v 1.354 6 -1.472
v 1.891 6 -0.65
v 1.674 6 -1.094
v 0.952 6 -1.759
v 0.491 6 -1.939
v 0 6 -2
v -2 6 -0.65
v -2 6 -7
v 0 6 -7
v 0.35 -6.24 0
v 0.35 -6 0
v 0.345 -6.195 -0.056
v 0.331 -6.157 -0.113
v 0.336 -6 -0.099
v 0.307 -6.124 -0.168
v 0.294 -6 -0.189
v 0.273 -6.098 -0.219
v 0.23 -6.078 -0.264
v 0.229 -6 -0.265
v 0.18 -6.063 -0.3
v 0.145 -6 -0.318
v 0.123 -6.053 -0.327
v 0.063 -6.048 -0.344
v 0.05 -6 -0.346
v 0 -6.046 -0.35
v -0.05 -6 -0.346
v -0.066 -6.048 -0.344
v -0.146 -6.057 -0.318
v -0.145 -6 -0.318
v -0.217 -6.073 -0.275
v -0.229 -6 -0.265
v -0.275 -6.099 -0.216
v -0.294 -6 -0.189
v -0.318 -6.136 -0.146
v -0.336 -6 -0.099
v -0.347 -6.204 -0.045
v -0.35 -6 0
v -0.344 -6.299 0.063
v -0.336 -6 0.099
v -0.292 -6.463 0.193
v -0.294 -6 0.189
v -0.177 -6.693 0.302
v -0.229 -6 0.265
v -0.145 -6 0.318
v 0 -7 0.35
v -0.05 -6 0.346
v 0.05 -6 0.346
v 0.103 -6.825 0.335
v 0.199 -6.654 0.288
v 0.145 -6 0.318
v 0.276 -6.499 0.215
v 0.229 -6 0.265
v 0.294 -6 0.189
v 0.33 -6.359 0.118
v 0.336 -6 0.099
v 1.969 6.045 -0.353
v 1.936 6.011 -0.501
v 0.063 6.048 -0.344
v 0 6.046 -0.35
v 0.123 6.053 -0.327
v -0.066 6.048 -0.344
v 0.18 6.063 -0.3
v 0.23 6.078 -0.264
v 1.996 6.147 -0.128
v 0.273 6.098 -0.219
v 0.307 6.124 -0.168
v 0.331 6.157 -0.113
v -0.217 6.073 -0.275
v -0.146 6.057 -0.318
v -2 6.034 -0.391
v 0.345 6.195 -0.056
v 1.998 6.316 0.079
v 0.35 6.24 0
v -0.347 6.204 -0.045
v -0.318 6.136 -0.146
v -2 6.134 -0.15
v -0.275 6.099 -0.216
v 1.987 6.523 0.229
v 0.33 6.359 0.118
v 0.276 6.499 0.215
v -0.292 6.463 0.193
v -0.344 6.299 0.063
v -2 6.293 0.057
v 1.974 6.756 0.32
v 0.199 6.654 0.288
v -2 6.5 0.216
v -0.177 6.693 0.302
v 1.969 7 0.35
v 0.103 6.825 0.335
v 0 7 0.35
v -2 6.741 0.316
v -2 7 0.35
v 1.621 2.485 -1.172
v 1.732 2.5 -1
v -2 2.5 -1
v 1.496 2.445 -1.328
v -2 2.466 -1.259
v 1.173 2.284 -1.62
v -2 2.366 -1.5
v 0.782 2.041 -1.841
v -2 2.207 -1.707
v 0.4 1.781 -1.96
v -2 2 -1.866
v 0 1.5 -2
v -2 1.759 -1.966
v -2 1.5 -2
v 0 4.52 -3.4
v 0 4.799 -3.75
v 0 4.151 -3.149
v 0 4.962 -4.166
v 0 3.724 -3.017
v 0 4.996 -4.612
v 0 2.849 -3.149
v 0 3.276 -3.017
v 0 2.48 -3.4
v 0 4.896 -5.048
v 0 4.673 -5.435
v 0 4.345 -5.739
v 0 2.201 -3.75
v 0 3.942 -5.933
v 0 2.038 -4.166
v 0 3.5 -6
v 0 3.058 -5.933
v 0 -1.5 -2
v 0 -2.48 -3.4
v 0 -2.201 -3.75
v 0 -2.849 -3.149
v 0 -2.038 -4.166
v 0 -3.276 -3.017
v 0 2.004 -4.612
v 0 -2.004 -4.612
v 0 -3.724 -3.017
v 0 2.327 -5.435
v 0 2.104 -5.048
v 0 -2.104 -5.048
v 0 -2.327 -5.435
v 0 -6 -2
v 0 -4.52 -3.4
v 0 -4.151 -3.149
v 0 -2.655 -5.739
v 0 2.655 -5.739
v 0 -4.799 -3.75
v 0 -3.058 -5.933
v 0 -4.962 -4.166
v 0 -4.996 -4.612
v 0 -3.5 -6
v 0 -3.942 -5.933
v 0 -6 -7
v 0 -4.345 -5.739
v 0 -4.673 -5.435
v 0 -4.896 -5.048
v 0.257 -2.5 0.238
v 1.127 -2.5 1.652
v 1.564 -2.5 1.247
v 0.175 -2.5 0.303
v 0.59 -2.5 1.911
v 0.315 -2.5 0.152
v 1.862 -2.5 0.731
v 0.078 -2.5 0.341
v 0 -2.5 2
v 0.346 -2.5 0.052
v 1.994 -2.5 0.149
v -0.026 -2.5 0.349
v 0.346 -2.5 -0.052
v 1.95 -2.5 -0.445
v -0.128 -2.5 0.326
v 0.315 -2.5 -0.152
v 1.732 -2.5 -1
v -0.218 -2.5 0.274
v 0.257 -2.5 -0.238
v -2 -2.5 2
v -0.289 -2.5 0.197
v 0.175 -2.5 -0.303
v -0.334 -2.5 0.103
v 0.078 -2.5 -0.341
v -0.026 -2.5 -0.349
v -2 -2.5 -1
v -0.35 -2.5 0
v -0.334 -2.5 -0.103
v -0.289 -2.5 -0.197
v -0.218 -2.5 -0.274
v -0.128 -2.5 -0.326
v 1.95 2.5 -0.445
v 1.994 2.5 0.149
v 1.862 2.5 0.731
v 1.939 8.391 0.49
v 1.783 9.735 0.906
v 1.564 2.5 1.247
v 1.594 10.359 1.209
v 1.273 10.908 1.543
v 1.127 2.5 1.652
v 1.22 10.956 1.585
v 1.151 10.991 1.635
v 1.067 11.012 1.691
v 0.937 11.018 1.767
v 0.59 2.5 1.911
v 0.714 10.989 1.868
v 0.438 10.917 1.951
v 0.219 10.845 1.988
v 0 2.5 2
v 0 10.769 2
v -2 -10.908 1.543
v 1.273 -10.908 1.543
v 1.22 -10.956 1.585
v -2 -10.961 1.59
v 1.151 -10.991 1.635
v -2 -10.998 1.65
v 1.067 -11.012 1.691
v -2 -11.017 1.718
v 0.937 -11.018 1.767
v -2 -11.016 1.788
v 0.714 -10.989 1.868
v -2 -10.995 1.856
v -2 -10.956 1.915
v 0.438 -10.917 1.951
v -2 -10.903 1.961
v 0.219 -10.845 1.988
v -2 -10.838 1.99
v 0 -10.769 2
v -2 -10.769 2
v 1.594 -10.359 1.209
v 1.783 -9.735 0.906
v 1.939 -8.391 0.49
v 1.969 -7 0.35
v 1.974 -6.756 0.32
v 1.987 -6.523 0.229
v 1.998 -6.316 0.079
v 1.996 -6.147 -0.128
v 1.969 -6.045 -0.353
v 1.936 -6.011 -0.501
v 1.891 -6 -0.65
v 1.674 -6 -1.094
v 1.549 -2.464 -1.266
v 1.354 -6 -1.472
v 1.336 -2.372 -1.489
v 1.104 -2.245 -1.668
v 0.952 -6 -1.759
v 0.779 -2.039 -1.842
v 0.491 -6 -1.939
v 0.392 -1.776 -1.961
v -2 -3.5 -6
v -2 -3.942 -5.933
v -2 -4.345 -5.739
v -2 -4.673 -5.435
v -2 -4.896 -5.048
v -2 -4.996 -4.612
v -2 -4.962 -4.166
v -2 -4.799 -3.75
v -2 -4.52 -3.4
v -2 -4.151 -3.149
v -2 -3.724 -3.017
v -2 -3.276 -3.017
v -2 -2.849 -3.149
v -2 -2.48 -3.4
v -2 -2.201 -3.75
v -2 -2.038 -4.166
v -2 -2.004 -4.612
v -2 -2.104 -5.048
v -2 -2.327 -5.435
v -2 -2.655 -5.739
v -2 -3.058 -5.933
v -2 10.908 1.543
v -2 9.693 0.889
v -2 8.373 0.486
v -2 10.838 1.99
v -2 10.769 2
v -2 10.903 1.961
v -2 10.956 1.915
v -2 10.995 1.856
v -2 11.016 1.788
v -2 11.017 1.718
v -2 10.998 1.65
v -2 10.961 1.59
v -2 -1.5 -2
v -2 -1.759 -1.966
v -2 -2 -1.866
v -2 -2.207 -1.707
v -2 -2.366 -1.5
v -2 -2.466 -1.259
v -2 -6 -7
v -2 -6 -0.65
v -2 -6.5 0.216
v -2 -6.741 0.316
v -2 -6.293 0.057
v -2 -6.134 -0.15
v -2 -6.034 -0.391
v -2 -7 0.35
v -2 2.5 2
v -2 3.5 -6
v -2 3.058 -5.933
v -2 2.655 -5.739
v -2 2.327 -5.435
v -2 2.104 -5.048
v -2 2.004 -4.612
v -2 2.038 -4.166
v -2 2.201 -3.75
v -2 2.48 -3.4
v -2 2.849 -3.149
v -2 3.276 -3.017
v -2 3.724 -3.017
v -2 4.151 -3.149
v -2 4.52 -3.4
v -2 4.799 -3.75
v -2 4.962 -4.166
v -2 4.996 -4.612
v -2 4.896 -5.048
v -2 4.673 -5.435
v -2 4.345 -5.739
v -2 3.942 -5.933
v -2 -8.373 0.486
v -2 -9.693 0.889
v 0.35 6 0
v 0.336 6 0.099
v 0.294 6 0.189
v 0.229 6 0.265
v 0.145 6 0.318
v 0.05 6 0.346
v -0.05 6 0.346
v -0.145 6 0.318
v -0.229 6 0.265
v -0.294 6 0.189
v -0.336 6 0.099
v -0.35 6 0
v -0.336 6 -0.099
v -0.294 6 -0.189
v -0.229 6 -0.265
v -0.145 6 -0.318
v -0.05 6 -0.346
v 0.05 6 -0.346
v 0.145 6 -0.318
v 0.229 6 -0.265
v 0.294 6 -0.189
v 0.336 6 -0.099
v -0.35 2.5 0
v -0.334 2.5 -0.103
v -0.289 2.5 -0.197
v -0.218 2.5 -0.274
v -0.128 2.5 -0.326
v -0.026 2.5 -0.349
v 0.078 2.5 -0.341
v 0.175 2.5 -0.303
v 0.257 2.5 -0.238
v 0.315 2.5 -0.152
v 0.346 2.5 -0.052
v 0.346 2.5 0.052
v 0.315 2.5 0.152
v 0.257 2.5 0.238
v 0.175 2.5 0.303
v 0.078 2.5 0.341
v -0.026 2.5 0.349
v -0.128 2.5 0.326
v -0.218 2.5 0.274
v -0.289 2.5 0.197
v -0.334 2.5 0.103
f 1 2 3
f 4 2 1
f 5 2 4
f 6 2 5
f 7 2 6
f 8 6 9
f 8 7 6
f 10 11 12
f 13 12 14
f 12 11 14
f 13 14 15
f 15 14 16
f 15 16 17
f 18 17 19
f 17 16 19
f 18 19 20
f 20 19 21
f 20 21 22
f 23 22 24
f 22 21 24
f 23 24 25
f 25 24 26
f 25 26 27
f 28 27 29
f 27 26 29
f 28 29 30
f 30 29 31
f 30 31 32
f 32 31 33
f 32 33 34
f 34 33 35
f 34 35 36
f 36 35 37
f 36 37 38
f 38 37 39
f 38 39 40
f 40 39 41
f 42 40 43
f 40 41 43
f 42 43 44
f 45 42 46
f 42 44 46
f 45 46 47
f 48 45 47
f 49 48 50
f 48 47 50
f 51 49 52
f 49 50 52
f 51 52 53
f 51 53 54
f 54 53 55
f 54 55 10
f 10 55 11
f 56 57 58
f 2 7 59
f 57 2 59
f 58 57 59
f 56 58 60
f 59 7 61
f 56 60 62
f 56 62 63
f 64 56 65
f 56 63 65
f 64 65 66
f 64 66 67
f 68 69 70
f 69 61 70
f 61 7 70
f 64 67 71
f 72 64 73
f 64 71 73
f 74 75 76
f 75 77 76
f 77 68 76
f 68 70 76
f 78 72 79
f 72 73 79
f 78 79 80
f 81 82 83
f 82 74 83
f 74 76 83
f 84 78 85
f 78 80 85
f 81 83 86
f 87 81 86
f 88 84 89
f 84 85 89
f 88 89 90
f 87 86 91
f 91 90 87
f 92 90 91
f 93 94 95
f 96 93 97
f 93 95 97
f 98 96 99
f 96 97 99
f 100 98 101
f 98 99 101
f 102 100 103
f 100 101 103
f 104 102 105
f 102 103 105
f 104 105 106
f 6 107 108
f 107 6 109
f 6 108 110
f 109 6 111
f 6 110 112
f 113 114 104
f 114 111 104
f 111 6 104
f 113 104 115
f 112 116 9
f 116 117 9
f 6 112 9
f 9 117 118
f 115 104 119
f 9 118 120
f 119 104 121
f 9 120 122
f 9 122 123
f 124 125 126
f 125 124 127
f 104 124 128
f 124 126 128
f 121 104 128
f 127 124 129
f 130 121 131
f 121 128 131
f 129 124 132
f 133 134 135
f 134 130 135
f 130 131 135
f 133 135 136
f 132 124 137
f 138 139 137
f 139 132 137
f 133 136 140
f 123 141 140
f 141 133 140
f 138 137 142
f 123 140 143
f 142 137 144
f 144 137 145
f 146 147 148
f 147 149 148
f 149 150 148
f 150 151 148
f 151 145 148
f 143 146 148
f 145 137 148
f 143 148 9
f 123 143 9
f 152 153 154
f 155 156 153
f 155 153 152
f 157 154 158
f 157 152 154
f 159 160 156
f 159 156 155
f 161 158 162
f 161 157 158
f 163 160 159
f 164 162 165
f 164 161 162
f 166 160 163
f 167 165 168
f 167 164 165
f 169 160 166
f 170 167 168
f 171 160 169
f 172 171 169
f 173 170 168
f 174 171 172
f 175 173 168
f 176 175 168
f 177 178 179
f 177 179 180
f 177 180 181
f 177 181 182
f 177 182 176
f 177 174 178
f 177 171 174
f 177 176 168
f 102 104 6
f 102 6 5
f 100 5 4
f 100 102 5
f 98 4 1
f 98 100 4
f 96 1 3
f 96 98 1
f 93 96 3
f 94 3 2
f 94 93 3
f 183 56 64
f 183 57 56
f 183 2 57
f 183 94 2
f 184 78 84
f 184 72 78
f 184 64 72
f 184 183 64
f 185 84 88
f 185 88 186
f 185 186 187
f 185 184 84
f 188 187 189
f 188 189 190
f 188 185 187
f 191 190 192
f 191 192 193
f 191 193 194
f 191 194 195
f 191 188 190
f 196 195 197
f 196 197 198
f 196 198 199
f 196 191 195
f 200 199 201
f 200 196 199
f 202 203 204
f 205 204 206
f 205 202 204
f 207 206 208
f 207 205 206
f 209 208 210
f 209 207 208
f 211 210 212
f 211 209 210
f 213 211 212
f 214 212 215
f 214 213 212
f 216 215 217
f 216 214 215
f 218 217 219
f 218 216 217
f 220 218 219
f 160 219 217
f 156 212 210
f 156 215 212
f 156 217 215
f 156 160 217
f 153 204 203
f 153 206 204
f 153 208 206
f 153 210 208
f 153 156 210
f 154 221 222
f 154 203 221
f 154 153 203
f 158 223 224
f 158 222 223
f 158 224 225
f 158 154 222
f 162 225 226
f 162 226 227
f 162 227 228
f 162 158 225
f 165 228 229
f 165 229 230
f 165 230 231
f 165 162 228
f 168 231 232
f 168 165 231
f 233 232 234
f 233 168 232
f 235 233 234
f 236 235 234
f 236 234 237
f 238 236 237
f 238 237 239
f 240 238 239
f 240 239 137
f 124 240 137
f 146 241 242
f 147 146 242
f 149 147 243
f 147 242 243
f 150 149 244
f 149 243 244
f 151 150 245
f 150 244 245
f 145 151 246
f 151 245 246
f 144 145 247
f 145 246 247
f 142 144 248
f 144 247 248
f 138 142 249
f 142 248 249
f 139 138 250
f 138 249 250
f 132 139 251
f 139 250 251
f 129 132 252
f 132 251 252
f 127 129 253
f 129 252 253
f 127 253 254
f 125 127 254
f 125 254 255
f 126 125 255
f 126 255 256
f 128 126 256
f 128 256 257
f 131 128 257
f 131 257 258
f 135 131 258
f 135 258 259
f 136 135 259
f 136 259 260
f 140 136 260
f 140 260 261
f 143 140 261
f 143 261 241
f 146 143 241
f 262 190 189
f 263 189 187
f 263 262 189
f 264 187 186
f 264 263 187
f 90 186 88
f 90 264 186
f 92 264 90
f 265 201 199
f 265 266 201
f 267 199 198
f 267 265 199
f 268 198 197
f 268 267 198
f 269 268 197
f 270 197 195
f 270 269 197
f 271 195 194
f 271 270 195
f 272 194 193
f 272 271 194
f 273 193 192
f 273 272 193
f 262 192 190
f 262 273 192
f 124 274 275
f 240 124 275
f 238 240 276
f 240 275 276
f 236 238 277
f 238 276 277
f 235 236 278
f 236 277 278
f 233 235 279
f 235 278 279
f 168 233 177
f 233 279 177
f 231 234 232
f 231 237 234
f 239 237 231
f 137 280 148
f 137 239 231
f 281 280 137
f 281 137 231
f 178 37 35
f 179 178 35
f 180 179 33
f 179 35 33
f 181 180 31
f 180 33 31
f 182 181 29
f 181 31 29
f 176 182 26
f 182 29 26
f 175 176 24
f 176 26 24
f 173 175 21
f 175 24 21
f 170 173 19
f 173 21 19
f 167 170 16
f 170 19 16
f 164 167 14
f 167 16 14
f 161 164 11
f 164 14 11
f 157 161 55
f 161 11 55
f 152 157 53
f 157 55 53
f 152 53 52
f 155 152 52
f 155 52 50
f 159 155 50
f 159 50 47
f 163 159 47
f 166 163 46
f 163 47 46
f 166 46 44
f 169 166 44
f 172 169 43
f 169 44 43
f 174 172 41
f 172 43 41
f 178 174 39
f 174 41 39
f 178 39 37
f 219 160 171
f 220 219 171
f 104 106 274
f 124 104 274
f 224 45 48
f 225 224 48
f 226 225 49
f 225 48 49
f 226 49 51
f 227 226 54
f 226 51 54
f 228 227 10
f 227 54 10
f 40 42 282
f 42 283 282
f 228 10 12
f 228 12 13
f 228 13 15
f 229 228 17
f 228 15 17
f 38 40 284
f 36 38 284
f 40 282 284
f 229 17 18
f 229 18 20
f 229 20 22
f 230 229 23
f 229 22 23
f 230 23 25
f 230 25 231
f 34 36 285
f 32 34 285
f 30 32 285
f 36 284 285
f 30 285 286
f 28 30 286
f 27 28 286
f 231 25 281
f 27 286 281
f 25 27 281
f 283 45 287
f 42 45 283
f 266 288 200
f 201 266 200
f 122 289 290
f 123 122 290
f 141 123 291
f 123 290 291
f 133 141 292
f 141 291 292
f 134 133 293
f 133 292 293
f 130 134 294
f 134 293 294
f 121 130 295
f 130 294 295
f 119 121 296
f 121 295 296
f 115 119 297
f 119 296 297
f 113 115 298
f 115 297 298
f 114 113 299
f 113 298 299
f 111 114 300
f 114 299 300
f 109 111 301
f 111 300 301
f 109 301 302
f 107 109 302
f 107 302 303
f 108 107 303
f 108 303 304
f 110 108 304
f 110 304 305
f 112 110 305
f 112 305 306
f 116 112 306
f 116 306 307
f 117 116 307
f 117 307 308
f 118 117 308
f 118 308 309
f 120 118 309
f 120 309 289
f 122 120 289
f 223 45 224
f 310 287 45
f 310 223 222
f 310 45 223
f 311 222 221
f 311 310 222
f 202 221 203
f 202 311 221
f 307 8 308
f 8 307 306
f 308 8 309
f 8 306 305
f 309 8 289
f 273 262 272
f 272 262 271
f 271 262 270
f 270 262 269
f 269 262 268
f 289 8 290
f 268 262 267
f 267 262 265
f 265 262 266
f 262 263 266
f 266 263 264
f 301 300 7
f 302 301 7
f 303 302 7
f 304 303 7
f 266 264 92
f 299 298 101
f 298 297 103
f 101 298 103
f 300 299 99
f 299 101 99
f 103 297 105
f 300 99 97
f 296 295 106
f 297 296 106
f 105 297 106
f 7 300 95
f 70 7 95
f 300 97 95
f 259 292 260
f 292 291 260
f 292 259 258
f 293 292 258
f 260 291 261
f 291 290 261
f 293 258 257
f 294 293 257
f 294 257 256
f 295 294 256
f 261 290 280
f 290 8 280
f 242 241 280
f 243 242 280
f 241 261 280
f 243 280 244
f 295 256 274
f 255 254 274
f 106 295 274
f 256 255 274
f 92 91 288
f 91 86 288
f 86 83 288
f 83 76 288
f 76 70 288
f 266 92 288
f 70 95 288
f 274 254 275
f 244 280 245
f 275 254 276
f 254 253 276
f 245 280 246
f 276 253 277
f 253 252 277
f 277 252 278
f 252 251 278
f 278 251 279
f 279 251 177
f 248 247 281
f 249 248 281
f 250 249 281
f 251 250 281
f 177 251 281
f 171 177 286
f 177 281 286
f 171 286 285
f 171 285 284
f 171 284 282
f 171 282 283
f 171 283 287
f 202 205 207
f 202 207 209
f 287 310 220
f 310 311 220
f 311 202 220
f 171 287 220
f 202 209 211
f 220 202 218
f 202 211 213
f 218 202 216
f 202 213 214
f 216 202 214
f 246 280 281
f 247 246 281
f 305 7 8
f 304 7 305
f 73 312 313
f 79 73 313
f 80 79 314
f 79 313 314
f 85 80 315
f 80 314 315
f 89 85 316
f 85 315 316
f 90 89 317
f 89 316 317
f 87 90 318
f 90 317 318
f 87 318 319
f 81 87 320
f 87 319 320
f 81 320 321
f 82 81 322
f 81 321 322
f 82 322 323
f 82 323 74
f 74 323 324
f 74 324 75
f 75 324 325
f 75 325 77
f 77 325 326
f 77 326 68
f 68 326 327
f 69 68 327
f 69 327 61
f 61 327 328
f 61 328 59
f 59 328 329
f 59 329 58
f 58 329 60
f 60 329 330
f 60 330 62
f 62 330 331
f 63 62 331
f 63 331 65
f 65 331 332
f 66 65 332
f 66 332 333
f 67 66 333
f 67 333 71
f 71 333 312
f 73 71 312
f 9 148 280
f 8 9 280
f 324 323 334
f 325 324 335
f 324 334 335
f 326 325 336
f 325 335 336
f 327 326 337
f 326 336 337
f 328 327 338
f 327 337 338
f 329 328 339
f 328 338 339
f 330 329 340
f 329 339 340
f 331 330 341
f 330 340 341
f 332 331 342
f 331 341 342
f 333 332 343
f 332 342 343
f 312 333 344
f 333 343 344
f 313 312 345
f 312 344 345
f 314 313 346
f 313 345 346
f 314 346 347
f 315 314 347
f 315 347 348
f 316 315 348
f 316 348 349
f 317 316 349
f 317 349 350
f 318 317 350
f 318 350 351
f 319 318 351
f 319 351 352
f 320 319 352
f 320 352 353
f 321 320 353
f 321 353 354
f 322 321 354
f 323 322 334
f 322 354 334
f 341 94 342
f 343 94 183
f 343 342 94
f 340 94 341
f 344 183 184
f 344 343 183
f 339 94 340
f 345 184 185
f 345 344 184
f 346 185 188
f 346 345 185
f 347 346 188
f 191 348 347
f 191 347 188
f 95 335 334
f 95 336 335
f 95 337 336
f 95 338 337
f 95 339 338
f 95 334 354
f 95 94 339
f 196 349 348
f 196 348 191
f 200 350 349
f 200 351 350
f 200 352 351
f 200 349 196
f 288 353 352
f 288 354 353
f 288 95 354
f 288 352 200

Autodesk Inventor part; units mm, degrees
ref_plane "YZ Plane" through (0, 0, 0) normal (1, 0, 0) x (0, 1, 0)
ref_plane "XZ Plane" through (0, 0, 0) normal (0, 1, 0) x (-1, 0, 0)
ref_plane "XY Plane" through (0, 0, 0) normal (0, 0, 1) x (1, 0, 0)
sketch "Sketch1" plane through (0, 0, 0) normal (0, 1, 0) x (-1, 0, 0)
  line L0 (2, -7) -> (2, 2)
  line L1 (2, 2) -> (0, 2)
  arc A0 (0, 2) -> (0, -2) centre (0, 0) ccw
  line L2 (0, -2) -> (0, -7)
  line L3 (0, -7) -> (2, -7)
  circle A1 centre (0, 0) radius 0.35
  dimension "d0" = 5
  dimension "d1" = 2
  dimension "d2" = 2
  dimension "d3" = 0.7
extrude "Extrusion1" add sketch "Sketch1" along normal mid plane 12
sketch "Sketch2" plane through (0, -6, -7) normal (1, 0, 0) x (0, 0, -1)
  line L0 (0, 12) -> (0, 0) projected
  line L1 (-5, 12) -> (0, 12) projected
  line L2 (-5, 12) -> (-5, 0) projected
  line L3 (0, 0) -> (-5, 0) projected
  circle A0 centre (-2.5, 2.5) radius 2.5 construction
  line L4 (0, 0) -> (-5, 0) construction
  circle A1 centre (-2.5, 9.5) radius 2.5 construction
  line L5 (0, 12) -> (-9, 12) construction
  line L6 (-5, 12) -> (-5, 0) construction
  line L7 (0, 12) -> (0, 0) construction
  point P0 (-7, 6)
hole "Hole1" at (0, -3.5, -4.5) at (0, 3.5, -4.5) direction (-1, 0, 0) diameter 3 end through all
sketch "Sketch3" plane through (0, -6, -7) normal (1, 0, 0) x (0, 0, -1)
  circle A0 centre (-2.5, 2.5) radius 1.5 projected
  circle A1 centre (-2.5, 9.5) radius 1.5 projected
  line L0 (0, 12) -> (0, 0) projected
  line L1 (-5, 12) -> (0, 12) projected
  line L2 (-5, 12) -> (-5, 0) projected
  line L3 (0, 0) -> (-5, 0) projected
  line L4 (-9, 3.5) -> (-6, 3.5)
  line L5 (-5, 4.5) -> (-5, 7.5)
  line L6 (-6, 8.5) -> (-9, 8.5)
  line L7 (-9, 8.5) -> (-9, 3.5)
  arc A2 (-6, 3.5) -> (-5, 4.5) centre (-6, 4.5) ccw
  arc A3 (-5, 7.5) -> (-6, 8.5) centre (-6, 7.5) ccw
  line L8 (-9, 0) -> (-9, 12) projected
  point P0 (-7, 6)
  point P1 (-9, 6)
  dimension "d13" = 1
  dimension "d14" = 5
extrude "Extrusion2" cut sketch "Sketch3" along normal through all both and the other way through all contours L2 A2 L4 L7 L6 A3
sketch "Sketch4" plane through (0, -6, 0) normal (0, -1, 0) x (1, 0, 0)
  circle A0 centre (0, 0) radius 0.35 projected
  line L0 (-2, 2) -> (-2, -7) projected
  line L1 (-2, -7) -> (0, -7) projected
  line L2 (0, -7) -> (0, -2) projected
  arc A1 (0, -2) -> (0, 2) centre (0, 0) ccw projected
  line L3 (0, 2) -> (-2, 2) projected
  arc A2 (0, -2) -> (0, 2) centre (0, 0) ccw projected
  line L4 (0, -7) -> (0, -2) projected
  line L5 (0, -2) -> (-2, -2)
  line L6 (-2, 2) -> (-2, -7) projected
extrude "Extrusion3" add sketch "Sketch4" along normal blind 10 contours L3 A1 L5 L0
sketch "Sketch5" plane through (-2, -6, -7) normal (-1, 0, 0) x (0, 0, 1)
  line L0 (9, 3.5) -> (6, 3.5) projected
  arc A0 (5, 4.5) -> (6, 3.5) centre (6, 4.5) ccw projected
  line L1 (5, 4.5) -> (5, 7.5) projected
  arc A1 (6, 8.5) -> (5, 7.5) centre (6, 7.5) ccw projected
  line L2 (6, 8.5) -> (9, 8.5) projected
  line L3 (9, 8.5) -> (9, 12) projected
  line L4 (0, 12) -> (9, 12) projected
  line L5 (0, 12) -> (0, 0) projected
  line L6 (5, 0) -> (0, 0) projected
  line L7 (5, 0) -> (5, -10) projected
  line L8 (9, -10) -> (5, -10) projected
  line L9 (9, -10) -> (9, 3.5) projected
  circle A2 centre (2.5, 9.5) radius 1.5 projected
  circle A3 centre (2.5, 2.5) radius 1.5 projected
  arc A4 (7.35, -1) -> (6.35, 0) centre (6.35, -1) ccw
  line L10 (9, 3.5) -> (9, -10) projected
  arc A5 (7.35, -1) -> (9, -5.5141) centre (14.35, -1) ccw
  line L11 (5, 4.5) -> (5, 0) projected
  line L12 (5, 0) -> (6.35, 0)
  line L13 (7.35, -10) -> (6.65, -10) construction
  line L14 (6, 3.5) -> (9, 3.5) construction
  line L15 (9, -10) -> (9, 3.5) construction
  line L16 (9, -5.5141) -> (9, -10)
  line L17 (7.35, -10) -> (7.35, 3.5) projected
  arc A6 (8.5426, -4.9082) -> (9, -4.7686) centre (8.75, -4.7686) ccw
  line L18 (9, -5.5141) -> (9, -4.7686)
  point P0 (7, 6)
  dimension "d19" = 7
  dimension "d22" = 0.25
  dimension "d23" = 33.939
extrude "Extrusion4" cut sketch "Sketch5" against normal through all contours L9 A5 A6 | L17 L8 L7 L12 A4 | A5 L9 L8 L17
mirror "Mirror1" about plane through (0, 0, 0) normal (0, 1, 0) of "Extrusion3", "Extrusion4"
properties part number "+XPanel_AntennaMount" material "Acetal Resin, Black"
